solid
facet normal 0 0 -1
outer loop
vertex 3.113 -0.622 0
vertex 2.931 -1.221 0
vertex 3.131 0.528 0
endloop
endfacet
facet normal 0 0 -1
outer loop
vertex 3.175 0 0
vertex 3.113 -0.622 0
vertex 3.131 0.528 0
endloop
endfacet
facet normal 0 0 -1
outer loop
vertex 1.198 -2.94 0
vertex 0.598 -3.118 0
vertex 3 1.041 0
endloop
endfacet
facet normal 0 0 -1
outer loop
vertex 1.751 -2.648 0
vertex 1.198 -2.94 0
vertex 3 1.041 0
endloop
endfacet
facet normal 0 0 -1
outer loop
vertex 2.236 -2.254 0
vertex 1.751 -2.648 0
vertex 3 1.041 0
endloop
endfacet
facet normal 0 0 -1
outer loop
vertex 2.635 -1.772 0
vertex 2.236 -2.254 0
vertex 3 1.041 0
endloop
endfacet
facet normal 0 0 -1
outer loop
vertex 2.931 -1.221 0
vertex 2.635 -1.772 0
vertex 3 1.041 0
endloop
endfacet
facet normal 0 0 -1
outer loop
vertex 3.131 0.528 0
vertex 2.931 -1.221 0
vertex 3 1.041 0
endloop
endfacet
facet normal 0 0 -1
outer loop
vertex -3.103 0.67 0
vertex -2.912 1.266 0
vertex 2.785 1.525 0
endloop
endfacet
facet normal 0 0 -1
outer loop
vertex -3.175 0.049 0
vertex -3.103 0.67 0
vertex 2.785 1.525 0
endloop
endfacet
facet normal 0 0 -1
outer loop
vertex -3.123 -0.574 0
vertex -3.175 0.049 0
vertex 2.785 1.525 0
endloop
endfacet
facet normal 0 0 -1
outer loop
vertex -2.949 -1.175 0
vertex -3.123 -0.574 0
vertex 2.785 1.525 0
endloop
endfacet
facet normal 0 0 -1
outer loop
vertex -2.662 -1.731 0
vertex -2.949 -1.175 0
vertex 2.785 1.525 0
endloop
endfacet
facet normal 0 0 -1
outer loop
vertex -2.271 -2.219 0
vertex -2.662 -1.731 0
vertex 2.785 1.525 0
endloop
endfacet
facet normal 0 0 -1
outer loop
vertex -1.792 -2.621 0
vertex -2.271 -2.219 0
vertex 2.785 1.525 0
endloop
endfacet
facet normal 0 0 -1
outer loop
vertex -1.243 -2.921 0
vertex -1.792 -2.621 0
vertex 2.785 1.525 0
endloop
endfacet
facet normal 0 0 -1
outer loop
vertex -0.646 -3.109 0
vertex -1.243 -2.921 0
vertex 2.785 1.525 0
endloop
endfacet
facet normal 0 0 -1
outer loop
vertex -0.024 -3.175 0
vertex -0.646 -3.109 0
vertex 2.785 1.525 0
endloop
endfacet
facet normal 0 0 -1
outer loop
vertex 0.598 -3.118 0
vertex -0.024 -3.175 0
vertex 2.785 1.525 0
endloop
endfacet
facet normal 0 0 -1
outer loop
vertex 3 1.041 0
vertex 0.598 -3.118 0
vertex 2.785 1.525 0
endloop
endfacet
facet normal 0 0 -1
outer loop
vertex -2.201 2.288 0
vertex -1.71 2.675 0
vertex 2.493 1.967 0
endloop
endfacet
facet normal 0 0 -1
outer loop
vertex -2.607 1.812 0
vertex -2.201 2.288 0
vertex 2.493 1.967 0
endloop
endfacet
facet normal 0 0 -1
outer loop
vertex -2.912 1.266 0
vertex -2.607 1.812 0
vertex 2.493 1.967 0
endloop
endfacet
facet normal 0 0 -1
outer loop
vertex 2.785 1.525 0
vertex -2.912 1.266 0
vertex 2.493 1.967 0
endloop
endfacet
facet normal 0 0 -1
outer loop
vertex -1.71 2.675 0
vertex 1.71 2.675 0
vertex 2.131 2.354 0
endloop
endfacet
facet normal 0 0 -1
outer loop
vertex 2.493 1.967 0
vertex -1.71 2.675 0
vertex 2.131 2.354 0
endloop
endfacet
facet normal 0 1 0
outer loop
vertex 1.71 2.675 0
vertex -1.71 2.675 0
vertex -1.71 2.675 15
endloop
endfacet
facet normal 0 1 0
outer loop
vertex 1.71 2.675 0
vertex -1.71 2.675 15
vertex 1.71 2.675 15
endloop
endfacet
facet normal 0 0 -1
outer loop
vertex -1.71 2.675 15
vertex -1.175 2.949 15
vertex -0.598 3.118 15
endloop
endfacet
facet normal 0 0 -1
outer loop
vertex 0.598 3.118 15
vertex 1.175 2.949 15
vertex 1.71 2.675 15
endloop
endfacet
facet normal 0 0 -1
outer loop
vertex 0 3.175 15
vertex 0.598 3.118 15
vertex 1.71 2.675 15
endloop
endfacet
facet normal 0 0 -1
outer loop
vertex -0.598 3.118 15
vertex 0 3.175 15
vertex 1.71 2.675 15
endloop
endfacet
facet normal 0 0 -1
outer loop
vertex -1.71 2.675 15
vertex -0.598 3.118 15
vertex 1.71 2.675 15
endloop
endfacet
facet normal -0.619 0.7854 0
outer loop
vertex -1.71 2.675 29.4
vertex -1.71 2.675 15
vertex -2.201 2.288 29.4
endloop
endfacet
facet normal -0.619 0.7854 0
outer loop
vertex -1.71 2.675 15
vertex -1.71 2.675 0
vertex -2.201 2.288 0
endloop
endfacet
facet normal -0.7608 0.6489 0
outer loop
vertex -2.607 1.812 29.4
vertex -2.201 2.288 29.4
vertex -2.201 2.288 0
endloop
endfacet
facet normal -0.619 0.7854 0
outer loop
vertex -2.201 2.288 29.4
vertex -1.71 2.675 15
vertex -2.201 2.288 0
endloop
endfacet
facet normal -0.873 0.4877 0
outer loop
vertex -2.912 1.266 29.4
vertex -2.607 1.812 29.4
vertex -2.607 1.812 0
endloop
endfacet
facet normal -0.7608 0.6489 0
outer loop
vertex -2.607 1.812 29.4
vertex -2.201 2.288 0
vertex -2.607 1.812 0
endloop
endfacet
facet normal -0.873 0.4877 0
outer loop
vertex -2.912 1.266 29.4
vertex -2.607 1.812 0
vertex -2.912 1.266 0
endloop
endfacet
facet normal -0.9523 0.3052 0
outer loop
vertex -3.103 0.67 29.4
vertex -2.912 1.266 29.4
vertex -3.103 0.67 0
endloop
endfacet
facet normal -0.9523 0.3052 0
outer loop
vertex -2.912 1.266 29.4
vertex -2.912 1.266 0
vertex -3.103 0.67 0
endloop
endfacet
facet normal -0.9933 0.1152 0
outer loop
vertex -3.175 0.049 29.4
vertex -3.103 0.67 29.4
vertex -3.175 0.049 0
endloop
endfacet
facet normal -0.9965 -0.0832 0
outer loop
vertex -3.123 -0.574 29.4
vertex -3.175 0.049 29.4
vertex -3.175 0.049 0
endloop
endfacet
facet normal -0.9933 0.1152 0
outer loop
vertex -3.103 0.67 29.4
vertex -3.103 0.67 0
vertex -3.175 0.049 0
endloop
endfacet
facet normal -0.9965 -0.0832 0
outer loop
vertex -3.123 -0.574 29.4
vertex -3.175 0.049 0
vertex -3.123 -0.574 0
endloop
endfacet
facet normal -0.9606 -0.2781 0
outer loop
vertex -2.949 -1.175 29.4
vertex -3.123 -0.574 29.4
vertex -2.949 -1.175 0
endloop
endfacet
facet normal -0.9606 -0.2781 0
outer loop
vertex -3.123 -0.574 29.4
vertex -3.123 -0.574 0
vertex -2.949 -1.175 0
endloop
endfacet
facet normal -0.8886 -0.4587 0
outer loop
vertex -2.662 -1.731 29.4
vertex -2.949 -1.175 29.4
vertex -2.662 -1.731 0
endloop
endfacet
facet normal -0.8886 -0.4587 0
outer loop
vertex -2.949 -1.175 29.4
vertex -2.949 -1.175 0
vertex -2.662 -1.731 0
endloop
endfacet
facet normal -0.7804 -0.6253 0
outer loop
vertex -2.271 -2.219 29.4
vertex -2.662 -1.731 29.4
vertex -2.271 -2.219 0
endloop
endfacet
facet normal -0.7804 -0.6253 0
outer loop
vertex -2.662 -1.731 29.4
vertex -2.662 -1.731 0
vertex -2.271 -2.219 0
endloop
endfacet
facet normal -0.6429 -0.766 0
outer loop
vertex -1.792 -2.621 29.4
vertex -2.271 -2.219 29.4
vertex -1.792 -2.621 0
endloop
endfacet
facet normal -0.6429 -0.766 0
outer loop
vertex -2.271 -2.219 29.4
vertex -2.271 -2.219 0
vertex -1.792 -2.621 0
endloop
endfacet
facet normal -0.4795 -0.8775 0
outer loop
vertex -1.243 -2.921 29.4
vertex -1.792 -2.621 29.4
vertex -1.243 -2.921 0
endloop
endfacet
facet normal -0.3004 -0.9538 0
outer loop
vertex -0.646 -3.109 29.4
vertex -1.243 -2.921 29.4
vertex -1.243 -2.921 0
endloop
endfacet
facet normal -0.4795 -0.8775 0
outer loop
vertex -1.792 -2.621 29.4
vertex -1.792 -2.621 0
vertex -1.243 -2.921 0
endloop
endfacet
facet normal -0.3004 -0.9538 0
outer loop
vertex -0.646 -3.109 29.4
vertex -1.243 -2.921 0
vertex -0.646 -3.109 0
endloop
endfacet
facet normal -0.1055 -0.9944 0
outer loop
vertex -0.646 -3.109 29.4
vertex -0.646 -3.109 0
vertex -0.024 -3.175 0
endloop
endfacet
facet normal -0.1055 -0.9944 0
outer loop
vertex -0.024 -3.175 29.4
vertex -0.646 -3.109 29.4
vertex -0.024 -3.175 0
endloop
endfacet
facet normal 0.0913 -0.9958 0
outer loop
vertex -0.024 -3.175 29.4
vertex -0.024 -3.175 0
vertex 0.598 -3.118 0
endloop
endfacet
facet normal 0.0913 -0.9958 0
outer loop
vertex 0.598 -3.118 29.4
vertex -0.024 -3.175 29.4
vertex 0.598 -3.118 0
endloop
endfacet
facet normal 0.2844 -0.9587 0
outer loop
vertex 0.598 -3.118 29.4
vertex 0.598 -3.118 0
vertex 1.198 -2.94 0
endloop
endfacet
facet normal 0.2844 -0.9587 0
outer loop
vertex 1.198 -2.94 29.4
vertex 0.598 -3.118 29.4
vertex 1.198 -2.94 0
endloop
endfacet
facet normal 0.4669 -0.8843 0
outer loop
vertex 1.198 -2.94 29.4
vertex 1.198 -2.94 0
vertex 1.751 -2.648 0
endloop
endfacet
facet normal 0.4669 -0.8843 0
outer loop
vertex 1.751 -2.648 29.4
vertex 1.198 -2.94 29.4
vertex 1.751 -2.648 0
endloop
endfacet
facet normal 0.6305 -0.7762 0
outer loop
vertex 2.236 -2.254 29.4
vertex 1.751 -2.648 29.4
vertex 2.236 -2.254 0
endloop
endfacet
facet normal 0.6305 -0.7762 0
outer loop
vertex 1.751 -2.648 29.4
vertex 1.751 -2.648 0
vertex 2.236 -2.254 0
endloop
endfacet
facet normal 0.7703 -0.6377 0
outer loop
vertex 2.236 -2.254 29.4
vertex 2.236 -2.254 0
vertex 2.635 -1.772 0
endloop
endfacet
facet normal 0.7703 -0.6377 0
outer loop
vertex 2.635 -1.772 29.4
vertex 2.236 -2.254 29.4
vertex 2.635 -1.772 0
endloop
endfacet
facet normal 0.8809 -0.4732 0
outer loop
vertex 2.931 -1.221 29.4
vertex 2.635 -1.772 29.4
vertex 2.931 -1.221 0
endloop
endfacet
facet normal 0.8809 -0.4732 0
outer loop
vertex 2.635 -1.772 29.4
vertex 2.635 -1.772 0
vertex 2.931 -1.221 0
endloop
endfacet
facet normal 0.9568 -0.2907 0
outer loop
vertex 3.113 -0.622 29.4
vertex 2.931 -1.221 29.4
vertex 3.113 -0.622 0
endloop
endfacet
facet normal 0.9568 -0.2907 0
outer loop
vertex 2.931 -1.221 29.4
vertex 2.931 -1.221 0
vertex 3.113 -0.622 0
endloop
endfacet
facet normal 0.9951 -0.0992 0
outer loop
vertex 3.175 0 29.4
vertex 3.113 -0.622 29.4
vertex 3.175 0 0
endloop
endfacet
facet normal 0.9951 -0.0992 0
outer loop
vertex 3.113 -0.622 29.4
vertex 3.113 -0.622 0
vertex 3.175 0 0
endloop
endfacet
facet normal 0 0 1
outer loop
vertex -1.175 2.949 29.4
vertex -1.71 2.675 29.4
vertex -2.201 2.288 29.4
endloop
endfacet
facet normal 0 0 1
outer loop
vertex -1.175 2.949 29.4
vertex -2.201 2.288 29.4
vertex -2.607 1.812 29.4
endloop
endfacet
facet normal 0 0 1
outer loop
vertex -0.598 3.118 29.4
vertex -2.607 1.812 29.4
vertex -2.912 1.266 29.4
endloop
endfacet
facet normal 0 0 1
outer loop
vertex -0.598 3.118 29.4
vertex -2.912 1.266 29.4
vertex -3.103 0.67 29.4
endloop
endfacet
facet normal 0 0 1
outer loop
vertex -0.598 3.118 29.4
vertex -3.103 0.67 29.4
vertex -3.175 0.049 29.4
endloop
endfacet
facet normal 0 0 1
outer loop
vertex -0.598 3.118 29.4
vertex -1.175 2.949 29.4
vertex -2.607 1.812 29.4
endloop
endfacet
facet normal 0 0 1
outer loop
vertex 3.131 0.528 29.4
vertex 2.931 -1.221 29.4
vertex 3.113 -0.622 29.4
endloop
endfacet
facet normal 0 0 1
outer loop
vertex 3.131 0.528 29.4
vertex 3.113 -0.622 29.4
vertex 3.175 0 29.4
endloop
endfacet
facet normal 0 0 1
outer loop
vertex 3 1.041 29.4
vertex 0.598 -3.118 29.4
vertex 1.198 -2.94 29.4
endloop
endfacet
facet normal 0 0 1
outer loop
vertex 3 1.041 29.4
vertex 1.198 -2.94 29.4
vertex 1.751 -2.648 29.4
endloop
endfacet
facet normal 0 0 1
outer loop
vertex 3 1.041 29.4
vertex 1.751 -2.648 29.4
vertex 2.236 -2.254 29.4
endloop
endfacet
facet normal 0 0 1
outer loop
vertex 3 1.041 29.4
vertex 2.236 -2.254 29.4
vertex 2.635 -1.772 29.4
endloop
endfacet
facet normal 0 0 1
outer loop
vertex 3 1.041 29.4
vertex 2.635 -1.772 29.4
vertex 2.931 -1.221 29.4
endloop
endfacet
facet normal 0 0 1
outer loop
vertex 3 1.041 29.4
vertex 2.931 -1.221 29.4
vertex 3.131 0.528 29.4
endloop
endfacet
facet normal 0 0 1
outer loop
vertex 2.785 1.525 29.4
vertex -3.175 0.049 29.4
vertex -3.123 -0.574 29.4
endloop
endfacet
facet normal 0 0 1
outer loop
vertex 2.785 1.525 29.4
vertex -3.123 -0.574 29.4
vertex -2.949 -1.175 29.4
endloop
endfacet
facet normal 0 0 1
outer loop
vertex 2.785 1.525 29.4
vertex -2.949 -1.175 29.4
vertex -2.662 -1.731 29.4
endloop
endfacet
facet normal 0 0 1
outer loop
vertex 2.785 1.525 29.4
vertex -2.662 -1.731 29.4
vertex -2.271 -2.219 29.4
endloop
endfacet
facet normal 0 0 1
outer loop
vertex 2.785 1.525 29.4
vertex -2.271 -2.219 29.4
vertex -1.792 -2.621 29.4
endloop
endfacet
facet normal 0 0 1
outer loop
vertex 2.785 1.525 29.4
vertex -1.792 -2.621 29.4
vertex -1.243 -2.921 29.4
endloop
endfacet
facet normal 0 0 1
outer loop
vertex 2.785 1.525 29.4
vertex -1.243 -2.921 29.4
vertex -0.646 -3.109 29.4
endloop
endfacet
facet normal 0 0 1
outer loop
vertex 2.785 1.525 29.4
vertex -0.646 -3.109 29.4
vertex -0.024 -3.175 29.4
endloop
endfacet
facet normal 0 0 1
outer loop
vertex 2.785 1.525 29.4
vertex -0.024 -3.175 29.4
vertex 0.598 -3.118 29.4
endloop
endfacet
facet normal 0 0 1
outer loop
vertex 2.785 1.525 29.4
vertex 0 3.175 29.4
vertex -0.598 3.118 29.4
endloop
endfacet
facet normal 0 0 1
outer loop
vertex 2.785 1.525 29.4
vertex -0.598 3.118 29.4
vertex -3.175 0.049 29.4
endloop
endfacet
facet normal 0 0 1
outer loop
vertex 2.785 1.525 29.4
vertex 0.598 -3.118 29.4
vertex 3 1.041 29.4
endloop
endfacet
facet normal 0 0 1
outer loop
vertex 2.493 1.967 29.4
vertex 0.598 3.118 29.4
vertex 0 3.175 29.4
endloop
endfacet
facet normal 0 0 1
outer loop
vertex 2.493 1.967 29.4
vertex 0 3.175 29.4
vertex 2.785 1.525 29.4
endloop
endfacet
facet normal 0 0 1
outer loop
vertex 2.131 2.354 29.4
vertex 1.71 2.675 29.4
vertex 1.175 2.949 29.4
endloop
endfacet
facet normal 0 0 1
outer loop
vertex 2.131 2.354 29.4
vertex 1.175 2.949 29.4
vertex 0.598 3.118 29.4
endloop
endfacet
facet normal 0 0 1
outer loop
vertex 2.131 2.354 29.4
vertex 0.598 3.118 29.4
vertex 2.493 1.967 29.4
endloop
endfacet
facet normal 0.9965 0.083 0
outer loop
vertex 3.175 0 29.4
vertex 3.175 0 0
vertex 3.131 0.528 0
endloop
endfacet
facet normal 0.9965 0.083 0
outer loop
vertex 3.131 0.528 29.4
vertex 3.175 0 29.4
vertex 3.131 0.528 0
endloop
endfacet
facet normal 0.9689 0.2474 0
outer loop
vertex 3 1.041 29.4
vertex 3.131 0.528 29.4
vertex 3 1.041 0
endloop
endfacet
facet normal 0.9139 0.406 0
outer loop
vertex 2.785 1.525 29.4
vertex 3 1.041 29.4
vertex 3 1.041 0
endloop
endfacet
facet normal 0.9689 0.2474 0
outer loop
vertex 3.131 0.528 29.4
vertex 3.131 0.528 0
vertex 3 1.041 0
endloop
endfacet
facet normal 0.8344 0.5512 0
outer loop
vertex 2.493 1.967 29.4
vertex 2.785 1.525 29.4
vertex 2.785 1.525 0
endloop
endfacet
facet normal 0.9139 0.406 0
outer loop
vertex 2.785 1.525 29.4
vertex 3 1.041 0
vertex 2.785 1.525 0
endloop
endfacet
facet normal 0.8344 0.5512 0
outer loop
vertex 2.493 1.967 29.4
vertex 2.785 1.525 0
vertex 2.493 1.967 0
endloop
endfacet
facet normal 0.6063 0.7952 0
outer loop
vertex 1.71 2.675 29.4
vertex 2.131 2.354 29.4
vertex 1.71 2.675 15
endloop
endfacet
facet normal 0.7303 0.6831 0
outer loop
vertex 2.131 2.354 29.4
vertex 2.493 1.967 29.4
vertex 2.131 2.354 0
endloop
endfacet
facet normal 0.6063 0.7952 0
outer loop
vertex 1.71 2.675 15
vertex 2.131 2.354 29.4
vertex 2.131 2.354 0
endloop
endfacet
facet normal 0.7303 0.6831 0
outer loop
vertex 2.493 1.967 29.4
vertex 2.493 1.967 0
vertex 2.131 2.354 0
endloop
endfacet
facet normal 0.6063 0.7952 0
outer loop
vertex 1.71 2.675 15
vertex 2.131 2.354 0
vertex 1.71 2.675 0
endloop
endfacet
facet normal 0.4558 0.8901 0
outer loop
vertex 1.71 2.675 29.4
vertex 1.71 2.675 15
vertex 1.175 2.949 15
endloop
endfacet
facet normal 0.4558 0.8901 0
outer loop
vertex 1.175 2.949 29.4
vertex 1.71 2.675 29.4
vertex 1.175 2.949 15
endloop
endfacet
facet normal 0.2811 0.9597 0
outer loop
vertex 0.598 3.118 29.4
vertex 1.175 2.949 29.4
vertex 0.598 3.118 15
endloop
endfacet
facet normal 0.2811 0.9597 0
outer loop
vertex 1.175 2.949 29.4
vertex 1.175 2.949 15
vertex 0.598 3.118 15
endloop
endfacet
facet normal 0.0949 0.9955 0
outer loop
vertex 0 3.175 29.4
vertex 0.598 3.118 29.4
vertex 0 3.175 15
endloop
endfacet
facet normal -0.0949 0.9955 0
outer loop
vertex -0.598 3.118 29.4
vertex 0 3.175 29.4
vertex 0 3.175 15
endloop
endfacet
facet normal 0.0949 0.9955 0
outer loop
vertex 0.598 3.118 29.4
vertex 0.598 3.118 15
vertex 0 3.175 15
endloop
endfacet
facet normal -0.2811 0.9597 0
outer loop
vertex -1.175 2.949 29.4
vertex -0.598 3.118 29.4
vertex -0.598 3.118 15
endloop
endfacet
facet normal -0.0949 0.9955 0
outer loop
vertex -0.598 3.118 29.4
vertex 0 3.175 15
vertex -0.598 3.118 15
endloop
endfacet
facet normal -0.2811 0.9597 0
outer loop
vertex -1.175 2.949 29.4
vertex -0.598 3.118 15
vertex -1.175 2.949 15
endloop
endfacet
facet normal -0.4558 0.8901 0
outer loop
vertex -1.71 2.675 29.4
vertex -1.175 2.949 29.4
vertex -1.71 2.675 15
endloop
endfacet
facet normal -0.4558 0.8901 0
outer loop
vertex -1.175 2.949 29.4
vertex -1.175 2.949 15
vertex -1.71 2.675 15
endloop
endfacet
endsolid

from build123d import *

# Parameters (mm, degrees)
SKETCH1_R           = 3.175
BOSS_EXTRUDE1_DEPTH = 29.4
CUT_EXTRUDE1_DEPTH  = 15


with BuildPart() as part:
    # Sketch1 → Boss-Extrude1 (new body)
    with BuildSketch(Plane.XY):
        Circle(SKETCH1_R)
    extrude(amount=BOSS_EXTRUDE1_DEPTH)

    # Sketch1<3> → Cut-Extrude1 (cut)
    with BuildSketch(Plane.XY):
        with BuildLine():
            Line((-1.710263138, 2.675), (0, 2.675))
            Line((0, 2.675), (1.710263138, 2.675))
            ThreePointArc((1.710263138, 2.675), (0, 3.175), (-1.710263138, 2.675))
        make_face()
    extrude(amount=CUT_EXTRUDE1_DEPTH, mode=Mode.SUBTRACT)


solid = part.part
